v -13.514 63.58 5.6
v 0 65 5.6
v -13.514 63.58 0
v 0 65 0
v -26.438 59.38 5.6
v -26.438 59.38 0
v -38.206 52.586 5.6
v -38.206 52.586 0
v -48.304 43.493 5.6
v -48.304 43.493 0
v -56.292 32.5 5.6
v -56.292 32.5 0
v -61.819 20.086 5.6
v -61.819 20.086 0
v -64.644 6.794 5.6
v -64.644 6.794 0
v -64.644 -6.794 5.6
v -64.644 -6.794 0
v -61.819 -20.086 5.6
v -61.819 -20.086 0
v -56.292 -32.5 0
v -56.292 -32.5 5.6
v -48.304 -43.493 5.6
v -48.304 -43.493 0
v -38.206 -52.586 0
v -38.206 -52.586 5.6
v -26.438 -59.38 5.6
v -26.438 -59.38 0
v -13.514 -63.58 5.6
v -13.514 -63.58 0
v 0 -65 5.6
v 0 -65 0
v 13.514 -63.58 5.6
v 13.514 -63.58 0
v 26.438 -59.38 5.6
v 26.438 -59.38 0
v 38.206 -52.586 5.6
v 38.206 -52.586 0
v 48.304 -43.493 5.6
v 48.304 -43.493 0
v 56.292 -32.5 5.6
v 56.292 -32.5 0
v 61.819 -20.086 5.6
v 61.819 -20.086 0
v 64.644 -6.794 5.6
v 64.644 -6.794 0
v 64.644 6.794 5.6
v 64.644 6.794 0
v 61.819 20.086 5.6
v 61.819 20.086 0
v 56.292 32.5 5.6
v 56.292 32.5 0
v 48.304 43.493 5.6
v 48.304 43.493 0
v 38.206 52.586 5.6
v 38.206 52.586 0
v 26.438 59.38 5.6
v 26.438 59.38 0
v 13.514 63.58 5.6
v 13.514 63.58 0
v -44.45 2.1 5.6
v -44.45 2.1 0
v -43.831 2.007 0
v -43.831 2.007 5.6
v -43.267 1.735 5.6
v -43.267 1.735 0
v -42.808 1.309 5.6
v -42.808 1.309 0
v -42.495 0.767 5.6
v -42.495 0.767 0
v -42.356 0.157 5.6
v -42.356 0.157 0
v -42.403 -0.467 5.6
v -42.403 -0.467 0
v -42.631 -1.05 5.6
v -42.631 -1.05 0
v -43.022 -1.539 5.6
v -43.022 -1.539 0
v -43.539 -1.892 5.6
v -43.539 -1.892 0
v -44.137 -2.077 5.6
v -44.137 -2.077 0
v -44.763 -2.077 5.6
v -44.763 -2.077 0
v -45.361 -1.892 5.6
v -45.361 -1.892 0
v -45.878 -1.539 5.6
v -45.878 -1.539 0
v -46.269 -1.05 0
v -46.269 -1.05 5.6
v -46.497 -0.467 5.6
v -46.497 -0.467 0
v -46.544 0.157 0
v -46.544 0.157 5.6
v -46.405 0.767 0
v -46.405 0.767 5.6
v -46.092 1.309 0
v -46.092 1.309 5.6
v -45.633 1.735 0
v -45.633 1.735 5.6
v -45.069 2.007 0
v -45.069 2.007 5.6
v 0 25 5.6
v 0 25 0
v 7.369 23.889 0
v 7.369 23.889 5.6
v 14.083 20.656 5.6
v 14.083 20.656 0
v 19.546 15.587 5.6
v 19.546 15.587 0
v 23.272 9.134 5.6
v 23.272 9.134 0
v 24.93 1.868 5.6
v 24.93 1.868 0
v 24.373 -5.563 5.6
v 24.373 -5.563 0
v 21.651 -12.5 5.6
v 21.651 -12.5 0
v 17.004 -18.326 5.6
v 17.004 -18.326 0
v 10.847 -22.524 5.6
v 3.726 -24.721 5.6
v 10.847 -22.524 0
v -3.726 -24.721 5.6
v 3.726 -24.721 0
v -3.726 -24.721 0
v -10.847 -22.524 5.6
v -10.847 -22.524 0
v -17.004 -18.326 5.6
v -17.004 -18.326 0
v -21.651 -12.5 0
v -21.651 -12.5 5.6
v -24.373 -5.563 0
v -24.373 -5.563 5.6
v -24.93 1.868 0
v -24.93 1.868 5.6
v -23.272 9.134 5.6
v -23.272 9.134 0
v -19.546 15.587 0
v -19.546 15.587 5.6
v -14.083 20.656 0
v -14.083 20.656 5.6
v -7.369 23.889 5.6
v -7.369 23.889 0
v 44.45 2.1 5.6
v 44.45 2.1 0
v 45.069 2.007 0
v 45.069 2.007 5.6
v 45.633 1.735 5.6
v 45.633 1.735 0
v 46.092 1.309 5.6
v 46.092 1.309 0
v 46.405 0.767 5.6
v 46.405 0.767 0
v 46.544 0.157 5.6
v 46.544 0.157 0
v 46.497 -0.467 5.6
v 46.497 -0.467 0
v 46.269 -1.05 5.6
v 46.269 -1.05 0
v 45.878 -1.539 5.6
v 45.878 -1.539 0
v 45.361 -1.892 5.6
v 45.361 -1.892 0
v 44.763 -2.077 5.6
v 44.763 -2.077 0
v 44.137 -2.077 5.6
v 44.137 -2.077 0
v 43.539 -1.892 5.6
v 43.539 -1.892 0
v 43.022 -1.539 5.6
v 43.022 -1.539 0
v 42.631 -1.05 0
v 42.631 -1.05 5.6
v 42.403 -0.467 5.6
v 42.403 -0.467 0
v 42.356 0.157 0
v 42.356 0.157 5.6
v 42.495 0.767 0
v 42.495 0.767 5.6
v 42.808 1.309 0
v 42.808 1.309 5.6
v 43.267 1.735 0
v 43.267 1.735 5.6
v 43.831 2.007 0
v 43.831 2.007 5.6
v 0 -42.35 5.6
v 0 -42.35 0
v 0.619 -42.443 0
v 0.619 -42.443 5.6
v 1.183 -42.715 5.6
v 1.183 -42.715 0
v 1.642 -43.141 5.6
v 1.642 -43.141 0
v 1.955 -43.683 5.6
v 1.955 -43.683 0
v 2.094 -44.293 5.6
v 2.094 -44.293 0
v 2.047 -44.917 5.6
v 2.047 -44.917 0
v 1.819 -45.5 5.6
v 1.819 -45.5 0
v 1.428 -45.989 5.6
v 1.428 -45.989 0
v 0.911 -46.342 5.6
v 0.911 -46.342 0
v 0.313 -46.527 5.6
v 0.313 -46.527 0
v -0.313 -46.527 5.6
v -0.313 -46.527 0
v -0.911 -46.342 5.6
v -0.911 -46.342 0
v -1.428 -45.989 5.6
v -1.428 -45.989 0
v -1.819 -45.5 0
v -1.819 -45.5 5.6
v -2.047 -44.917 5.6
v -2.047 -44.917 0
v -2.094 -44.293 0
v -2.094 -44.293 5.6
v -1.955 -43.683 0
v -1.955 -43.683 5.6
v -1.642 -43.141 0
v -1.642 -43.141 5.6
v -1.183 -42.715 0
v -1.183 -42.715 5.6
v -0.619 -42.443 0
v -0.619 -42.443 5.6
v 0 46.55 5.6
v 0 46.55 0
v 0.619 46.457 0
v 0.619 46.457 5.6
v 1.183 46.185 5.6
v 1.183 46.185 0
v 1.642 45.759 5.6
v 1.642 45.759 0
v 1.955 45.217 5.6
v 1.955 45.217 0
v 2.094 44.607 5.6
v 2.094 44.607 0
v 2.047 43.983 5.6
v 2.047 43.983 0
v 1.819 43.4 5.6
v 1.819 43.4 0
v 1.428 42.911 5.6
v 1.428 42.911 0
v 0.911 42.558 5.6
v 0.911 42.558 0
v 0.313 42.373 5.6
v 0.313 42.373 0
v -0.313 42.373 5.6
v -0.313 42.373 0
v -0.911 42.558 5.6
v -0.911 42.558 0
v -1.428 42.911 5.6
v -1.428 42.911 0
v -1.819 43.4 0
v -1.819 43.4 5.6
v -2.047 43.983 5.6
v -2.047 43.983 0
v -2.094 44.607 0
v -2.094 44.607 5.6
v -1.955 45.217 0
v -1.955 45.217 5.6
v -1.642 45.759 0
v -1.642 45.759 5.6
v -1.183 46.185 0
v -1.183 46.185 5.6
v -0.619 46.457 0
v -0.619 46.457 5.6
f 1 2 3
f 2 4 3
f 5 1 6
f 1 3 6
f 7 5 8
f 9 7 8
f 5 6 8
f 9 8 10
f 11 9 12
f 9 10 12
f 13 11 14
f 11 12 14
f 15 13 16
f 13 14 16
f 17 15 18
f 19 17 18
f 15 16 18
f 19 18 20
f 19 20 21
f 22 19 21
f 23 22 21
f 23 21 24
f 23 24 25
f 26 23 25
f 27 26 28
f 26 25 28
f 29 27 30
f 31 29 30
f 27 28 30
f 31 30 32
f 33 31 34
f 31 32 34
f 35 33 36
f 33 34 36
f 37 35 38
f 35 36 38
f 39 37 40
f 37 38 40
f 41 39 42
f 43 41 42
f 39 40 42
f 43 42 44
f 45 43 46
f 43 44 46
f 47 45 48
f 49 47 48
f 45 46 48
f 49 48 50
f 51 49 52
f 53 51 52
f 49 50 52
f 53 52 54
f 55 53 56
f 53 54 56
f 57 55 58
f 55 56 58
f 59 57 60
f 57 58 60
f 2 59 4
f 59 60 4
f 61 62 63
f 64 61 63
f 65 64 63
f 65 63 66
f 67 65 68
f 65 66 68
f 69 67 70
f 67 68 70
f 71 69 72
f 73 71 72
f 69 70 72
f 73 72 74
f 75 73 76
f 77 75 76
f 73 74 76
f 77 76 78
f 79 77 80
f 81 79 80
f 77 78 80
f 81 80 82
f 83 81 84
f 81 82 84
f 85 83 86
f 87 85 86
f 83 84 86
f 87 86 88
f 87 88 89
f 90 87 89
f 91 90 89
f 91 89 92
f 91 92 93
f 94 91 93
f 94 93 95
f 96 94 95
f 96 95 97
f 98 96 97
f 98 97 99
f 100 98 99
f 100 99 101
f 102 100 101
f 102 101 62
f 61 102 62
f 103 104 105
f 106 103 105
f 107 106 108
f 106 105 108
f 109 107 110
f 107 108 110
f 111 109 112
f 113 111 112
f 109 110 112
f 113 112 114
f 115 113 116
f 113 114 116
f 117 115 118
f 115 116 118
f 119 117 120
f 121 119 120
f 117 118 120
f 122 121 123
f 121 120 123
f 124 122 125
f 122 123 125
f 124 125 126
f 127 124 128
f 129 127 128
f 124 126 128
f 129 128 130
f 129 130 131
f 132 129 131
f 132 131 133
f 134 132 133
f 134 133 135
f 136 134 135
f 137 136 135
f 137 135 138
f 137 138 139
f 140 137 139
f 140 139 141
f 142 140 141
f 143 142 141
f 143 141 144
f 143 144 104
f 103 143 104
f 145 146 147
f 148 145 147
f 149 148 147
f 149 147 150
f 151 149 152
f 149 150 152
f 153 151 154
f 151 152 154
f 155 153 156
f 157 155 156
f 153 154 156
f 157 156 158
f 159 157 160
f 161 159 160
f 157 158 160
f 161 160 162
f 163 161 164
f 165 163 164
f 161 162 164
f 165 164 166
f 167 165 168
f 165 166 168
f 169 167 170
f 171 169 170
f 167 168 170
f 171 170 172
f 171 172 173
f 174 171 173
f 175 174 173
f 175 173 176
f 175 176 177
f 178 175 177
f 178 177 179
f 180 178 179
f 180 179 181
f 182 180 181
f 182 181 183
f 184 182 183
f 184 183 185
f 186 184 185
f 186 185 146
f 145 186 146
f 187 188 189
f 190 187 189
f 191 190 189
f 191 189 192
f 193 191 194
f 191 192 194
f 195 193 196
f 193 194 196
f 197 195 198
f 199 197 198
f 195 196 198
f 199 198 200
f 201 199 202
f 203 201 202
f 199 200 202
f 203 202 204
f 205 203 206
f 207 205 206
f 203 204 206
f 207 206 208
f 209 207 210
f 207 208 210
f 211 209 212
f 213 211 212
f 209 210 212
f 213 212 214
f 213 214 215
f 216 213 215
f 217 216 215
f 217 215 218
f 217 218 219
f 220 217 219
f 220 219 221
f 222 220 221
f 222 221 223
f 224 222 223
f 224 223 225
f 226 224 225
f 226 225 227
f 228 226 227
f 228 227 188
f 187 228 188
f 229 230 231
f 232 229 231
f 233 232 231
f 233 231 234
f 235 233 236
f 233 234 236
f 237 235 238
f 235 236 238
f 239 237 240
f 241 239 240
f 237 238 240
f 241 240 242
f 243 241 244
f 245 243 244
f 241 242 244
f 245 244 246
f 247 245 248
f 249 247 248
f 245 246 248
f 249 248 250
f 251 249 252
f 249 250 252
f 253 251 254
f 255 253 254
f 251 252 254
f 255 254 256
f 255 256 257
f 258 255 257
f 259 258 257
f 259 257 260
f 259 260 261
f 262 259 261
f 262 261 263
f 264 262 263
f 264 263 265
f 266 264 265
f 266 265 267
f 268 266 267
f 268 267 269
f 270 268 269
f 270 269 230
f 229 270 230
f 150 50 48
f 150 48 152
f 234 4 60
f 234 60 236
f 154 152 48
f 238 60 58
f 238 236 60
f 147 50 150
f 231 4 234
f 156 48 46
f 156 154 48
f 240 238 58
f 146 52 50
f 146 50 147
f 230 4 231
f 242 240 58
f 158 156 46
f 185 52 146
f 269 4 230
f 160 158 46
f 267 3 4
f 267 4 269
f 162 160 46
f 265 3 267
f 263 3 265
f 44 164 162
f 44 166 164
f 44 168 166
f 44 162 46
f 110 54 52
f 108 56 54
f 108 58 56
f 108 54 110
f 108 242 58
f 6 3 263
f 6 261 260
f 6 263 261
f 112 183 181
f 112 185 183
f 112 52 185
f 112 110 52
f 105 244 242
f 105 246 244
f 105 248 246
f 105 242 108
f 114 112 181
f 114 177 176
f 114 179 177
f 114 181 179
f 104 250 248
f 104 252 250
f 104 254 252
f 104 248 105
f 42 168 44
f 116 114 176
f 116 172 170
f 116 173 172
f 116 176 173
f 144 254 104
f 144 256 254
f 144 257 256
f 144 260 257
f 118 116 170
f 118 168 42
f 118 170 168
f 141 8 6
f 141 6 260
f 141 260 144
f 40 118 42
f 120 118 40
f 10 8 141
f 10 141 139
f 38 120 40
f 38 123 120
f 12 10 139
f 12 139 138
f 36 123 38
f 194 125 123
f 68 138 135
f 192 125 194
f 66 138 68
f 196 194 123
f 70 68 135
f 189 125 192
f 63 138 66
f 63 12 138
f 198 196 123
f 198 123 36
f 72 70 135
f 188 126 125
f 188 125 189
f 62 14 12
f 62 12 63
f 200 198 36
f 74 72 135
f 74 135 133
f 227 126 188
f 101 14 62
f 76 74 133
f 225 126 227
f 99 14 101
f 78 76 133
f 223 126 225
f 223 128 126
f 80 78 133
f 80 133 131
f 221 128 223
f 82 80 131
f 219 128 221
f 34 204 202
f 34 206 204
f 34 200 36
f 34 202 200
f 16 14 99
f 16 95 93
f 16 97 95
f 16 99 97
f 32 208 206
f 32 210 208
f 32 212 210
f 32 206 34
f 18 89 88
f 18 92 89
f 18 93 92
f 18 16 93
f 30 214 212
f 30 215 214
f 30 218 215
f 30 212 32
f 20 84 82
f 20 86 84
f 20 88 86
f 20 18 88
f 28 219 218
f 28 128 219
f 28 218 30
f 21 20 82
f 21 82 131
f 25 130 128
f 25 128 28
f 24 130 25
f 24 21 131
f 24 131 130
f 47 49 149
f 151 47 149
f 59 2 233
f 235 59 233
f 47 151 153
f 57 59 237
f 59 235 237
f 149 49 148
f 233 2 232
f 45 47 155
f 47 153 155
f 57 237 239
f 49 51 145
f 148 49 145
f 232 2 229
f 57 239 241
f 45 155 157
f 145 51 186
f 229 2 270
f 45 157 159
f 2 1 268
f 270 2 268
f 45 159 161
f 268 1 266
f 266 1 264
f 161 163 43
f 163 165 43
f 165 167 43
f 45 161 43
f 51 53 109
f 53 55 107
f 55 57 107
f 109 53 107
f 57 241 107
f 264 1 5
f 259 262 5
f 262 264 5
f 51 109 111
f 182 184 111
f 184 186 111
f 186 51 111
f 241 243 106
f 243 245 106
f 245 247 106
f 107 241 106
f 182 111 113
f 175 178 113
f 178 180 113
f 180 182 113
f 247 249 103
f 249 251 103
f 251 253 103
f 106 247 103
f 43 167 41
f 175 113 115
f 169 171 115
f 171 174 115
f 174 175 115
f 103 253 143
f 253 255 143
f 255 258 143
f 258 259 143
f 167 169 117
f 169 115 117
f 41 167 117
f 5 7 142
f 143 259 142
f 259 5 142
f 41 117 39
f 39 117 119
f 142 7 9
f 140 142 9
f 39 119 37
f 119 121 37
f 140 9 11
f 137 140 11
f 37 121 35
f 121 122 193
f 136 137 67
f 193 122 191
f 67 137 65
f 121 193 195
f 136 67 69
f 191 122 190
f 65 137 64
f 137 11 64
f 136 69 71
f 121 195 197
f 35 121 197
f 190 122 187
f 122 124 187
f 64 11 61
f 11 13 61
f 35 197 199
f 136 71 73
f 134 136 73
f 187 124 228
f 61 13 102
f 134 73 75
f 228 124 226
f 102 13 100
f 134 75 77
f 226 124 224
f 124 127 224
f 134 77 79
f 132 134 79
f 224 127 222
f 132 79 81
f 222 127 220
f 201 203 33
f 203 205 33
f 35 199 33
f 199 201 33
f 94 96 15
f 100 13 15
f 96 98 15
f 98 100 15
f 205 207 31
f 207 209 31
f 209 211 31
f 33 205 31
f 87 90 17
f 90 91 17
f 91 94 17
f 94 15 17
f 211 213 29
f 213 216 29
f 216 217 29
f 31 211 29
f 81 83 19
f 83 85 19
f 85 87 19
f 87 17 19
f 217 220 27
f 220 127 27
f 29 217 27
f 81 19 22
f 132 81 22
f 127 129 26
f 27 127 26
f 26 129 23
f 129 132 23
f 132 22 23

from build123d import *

# Parameters (mm, degrees)
SKETCH_1_W          = 5.6
SKETCH_1_H          = 65
SKETCH_2_R          = 25
CUT_EXTRUDE_1_DEPTH = 93.094299498
SKETCH_3_R          = 2.1
CUT_EXTRUDE_2_DEPTH = 93.094299498


with BuildPart() as part:
    # ｽｹｯﾁ1 → 回転1 (revolve)
    with BuildSketch(Plane(origin=(0, 0, 0), x_dir=(0, 0, -1), z_dir=(1, 0, 0))):
        with Locations((-2.8, 32.5)):
            Rectangle(SKETCH_1_W, SKETCH_1_H)
    revolve(axis=Axis((0, 0, 0), (0, 0, 1)))

    # ｽｹｯﾁ2 → ｶｯﾄ - 押し出し1 (cut, through all)
    with BuildSketch(Plane(origin=(0, 0, 0), x_dir=(-1, 0, 0), z_dir=(0, 0, -1))):
        with Locations(Location((0, 0, 0), (0, 0, 90))):
            Circle(SKETCH_2_R)
    extrude(amount=-CUT_EXTRUDE_1_DEPTH, mode=Mode.SUBTRACT)

    # ｽｹｯﾁ3 → ｶｯﾄ - 押し出し2 (cut, through all)
    with BuildSketch(Plane(origin=(0, 0, 0), x_dir=(-1, 0, 0), z_dir=(0, 0, -1))):
        with Locations(Location((0, 44.45, 0), (0, 0, 90))):
            Circle(SKETCH_3_R)
        with Locations(Location((44.45, 0, 0), (0, 0, 90))):
            Circle(SKETCH_3_R)
        with Locations(Location((0, -44.45, 0), (0, 0, 90))):
            Circle(SKETCH_3_R)
        with Locations(Location((-44.45, 0, 0), (0, 0, 90))):
            Circle(SKETCH_3_R)
    extrude(amount=-CUT_EXTRUDE_2_DEPTH, mode=Mode.SUBTRACT)


solid = part.part
